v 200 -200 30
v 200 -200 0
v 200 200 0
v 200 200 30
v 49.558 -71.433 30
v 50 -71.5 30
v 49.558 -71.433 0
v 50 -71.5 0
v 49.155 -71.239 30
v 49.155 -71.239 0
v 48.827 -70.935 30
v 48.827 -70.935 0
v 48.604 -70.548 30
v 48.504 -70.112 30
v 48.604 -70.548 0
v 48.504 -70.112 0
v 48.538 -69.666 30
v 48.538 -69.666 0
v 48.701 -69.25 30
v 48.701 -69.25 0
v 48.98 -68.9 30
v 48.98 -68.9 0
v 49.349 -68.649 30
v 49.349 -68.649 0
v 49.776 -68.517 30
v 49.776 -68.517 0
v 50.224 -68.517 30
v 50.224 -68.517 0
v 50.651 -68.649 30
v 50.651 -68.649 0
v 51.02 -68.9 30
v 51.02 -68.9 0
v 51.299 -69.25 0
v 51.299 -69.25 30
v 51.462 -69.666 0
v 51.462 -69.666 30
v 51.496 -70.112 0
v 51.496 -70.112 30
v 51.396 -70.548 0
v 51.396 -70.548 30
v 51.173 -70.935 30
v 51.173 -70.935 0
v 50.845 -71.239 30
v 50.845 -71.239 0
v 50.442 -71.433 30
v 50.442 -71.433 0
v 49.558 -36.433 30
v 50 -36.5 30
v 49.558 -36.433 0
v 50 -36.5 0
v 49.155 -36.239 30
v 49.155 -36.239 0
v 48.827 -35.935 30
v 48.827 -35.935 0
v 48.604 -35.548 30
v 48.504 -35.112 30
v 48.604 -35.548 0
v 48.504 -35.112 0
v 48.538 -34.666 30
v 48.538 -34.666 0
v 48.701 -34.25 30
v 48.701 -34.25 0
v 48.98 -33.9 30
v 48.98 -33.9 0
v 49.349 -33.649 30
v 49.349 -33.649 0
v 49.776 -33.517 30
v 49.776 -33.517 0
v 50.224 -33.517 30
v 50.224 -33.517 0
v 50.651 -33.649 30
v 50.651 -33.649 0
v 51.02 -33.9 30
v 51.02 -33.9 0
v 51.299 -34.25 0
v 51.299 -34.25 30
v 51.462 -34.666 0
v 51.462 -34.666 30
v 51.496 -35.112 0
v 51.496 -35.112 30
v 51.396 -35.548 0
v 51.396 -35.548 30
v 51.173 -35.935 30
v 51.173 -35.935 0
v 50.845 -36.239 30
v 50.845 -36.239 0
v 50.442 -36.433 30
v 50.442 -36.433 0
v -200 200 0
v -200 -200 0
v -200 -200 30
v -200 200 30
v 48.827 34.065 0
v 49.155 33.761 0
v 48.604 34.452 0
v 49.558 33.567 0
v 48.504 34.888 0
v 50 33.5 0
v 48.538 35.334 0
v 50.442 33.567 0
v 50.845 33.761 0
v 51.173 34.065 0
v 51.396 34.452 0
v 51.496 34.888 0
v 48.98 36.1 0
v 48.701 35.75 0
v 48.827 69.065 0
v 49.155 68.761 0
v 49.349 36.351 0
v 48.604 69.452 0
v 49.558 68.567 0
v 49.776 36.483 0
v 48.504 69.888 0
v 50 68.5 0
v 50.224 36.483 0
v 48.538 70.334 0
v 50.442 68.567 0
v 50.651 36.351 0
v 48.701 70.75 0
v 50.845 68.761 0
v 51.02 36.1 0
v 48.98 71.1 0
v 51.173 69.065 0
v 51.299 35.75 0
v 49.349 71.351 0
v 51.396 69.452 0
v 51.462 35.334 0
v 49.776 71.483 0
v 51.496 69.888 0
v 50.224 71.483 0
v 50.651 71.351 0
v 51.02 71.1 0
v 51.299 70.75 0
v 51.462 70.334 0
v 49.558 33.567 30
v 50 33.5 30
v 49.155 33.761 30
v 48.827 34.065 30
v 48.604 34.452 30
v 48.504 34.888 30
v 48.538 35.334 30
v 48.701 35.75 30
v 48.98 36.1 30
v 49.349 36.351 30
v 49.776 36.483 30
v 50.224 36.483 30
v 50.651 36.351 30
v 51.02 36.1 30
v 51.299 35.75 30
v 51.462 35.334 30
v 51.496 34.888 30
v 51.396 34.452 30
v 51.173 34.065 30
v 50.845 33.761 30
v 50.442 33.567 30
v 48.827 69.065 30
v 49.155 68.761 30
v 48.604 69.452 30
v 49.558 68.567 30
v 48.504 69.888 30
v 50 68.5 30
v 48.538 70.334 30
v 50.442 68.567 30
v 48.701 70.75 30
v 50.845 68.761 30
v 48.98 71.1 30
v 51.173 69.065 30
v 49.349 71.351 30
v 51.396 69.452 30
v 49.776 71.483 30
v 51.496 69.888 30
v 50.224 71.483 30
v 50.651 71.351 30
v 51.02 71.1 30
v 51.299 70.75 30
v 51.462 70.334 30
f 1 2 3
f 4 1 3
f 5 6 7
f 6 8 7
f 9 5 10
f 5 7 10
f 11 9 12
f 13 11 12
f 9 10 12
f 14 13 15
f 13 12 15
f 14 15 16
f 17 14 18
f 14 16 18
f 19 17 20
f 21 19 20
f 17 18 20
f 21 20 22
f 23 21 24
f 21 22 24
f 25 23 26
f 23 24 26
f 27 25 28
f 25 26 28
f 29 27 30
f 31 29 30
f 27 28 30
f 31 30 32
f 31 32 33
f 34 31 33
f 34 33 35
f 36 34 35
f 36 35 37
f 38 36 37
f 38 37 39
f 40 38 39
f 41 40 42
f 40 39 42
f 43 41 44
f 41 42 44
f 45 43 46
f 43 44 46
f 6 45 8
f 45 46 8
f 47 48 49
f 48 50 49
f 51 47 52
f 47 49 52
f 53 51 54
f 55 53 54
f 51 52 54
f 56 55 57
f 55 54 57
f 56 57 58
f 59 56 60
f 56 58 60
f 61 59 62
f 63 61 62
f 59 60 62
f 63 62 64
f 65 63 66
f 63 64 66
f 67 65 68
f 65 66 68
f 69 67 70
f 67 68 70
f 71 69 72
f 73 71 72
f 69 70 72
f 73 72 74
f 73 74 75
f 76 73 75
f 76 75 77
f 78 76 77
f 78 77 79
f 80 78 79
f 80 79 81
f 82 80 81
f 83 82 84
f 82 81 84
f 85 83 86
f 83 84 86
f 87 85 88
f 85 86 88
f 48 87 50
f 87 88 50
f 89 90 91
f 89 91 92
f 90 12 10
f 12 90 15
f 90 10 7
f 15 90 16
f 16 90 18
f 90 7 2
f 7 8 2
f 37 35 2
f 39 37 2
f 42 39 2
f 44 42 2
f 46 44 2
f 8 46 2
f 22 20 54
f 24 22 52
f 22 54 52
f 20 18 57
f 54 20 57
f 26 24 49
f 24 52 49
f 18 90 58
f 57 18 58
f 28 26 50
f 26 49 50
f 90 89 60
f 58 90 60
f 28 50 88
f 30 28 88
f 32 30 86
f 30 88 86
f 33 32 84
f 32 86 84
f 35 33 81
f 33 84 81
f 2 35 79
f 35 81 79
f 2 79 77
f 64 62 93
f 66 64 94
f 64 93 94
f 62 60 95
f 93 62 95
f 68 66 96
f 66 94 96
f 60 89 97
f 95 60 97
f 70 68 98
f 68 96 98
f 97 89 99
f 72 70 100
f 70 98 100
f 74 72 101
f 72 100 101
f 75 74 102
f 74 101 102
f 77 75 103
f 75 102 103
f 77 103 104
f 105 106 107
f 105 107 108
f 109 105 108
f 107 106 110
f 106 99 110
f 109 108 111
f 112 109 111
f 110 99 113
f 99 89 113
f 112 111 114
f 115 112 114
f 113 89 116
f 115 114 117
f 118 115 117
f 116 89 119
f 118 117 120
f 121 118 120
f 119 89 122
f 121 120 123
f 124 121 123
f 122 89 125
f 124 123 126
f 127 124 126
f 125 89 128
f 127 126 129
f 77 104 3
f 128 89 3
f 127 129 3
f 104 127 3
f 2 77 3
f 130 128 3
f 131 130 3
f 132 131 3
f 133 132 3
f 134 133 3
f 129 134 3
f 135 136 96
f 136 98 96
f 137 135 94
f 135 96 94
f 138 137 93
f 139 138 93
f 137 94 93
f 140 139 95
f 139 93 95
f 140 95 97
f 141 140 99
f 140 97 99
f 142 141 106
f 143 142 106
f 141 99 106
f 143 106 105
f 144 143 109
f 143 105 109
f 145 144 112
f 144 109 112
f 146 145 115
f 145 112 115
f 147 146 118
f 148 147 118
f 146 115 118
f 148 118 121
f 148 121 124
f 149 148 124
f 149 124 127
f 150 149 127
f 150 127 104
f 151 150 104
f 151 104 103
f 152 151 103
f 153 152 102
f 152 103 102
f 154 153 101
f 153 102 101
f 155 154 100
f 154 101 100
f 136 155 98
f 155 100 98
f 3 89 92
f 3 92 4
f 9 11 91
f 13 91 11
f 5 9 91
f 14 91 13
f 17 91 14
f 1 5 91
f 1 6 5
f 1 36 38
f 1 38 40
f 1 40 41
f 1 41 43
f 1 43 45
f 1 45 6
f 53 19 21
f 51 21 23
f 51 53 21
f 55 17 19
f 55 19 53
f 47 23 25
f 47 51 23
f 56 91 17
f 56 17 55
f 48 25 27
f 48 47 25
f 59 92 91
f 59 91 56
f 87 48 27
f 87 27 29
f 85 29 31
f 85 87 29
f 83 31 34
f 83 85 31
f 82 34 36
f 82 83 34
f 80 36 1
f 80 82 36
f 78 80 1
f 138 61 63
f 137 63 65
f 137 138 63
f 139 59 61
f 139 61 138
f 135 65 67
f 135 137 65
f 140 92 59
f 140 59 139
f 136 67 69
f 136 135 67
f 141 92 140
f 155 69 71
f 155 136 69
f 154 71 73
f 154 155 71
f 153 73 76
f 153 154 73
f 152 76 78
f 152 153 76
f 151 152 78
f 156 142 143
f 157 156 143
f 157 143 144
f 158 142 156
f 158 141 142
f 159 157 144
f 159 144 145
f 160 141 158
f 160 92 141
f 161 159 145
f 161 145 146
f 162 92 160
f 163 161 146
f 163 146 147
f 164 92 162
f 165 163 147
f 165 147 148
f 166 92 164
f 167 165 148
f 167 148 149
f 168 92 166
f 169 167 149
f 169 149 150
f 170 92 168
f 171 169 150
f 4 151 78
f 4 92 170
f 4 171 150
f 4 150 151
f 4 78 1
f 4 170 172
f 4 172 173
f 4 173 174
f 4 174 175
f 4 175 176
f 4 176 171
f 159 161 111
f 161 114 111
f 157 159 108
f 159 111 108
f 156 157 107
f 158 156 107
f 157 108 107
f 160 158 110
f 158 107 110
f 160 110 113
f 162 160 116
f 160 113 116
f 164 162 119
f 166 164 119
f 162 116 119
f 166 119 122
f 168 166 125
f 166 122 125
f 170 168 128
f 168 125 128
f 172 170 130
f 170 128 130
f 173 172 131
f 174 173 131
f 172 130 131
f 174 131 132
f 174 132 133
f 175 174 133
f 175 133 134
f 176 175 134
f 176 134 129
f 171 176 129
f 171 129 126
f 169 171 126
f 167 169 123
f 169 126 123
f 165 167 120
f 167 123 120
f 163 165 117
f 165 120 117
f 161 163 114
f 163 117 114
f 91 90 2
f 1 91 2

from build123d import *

# Parameters (mm, degrees)
ESQUISSE1_W                          = 400
ESQUISSE1_H                          = 400
EXTRUSION1_DEPTH                     = 30
ESQUISSE4_W                          = 1.5
ESQUISSE4_H                          = 30
TROU_TARAUD_M32_AT_2_COUNT           = 2
TROU_TARAUD_M32_AT_2_PITCH           = 408.679576779
TROU_TARAUD_M32_AT_3_COUNT           = 2
TROU_TARAUD_M32_AT_3_PITCH           = 332.592834859
R_P_TITION_LIN_AIRE1_COUNT           = 5
R_P_TITION_LIN_AIRE1_PITCH           = 35
R_P_TITION_LIN_AIRE1_COPY_1_SKETCH_W = 1.5
R_P_TITION_LIN_AIRE1_COPY_1_SKETCH_H = 30
R_P_TITION_LIN_AIRE1_COPY_2_SKETCH_W = 1.5
R_P_TITION_LIN_AIRE1_COPY_2_SKETCH_H = 30
R_P_TITION_LIN_AIRE1_COPY_3_SKETCH_W = 1.5
R_P_TITION_LIN_AIRE1_COPY_3_SKETCH_H = 30
R_P_TITION_LIN_AIRE1_COPY_4_SKETCH_W = 1.5
R_P_TITION_LIN_AIRE1_COPY_4_SKETCH_H = 30
R_P_TITION_LIN_AIRE1_COPY_5_SKETCH_W = 1.5
R_P_TITION_LIN_AIRE1_COPY_5_SKETCH_H = 30
R_P_TITION_LIN_AIRE1_COPY_6_SKETCH_W = 1.5
R_P_TITION_LIN_AIRE1_COPY_6_SKETCH_H = 30


with BuildPart() as part:
    # Esquisse1 → Extrusion1 (new body)
    with BuildSketch(Plane.XY):
        Rectangle(ESQUISSE1_W, ESQUISSE1_H)
    extrude(amount=EXTRUSION1_DEPTH)

    # Esquisse4 → Trou taraudé M32 (revolve, cut)
    with BuildSketch(Plane(origin=(50, 70, 30), x_dir=(0, -1, 0), z_dir=(1, 0, 0))):
        with Locations((0.75, 15)):
            Rectangle(ESQUISSE4_W, ESQUISSE4_H)
    trou_taraud_m32 = revolve(axis=Axis((50, 70, 36.35), (0, 0, -1)), mode=Mode.SUBTRACT)

    # Trou taraudé M32 at 2: Trou taraudé M32 ×2
    with Locations(*[Vector(-0.8014096921823338, -0.5981157958758629, 0) * (i * TROU_TARAUD_M32_AT_2_PITCH) for i in range(1, TROU_TARAUD_M32_AT_2_COUNT)]):
        add(trou_taraud_m32, mode=Mode.SUBTRACT)

    # Trou taraudé M32 at 3: Trou taraudé M32 ×2
    with Locations(*[Vector(-0.8119019030947789, -0.5837938846468643, 0) * (i * TROU_TARAUD_M32_AT_3_PITCH) for i in range(1, TROU_TARAUD_M32_AT_3_COUNT)]):
        add(trou_taraud_m32, mode=Mode.SUBTRACT)

    # Répétition linéaire1: Trou taraudé M32 ×5, 1 skipped
    with Locations(*[(0, -i * R_P_TITION_LIN_AIRE1_PITCH, 0) for i in range(1, R_P_TITION_LIN_AIRE1_COUNT) if i not in (2,)]):
        add(trou_taraud_m32, mode=Mode.SUBTRACT)

    # Répétition linéaire1 copy 1 sketch → Répétition linéaire1 copy 1 (revolve, cut)
    with BuildSketch(Plane(origin=(-277.519773828, -209.437710323, 30), x_dir=(0, -1, 0), z_dir=(1, 0, 0))):
        with Locations((0.75, 15)):
            Rectangle(R_P_TITION_LIN_AIRE1_COPY_1_SKETCH_W, R_P_TITION_LIN_AIRE1_COPY_1_SKETCH_H)
    revolve(axis=Axis((-277.519773828, -209.437710323, 36.35), (0, 0, -1)), mode=Mode.SUBTRACT)

    # Répétition linéaire1 copy 2 sketch → Répétition linéaire1 copy 2 (revolve, cut)
    with BuildSketch(Plane(origin=(-277.519773828, -279.437710323, 30), x_dir=(0, -1, 0), z_dir=(1, 0, 0))):
        with Locations((0.75, 15)):
            Rectangle(R_P_TITION_LIN_AIRE1_COPY_2_SKETCH_W, R_P_TITION_LIN_AIRE1_COPY_2_SKETCH_H)
    revolve(axis=Axis((-277.519773828, -279.437710323, 36.35), (0, 0, -1)), mode=Mode.SUBTRACT)

    # Répétition linéaire1 copy 3 sketch → Répétition linéaire1 copy 3 (revolve, cut)
    with BuildSketch(Plane(origin=(-277.519773828, -314.437710323, 30), x_dir=(0, -1, 0), z_dir=(1, 0, 0))):
        with Locations((0.75, 15)):
            Rectangle(R_P_TITION_LIN_AIRE1_COPY_3_SKETCH_W, R_P_TITION_LIN_AIRE1_COPY_3_SKETCH_H)
    revolve(axis=Axis((-277.519773828, -314.437710323, 36.35), (0, 0, -1)), mode=Mode.SUBTRACT)

    # Répétition linéaire1 copy 4 sketch → Répétition linéaire1 copy 4 (revolve, cut)
    with BuildSketch(Plane(origin=(-220.032755578, -159.165663068, 30), x_dir=(0, -1, 0), z_dir=(1, 0, 0))):
        with Locations((0.75, 15)):
            Rectangle(R_P_TITION_LIN_AIRE1_COPY_4_SKETCH_W, R_P_TITION_LIN_AIRE1_COPY_4_SKETCH_H)
    revolve(axis=Axis((-220.032755578, -159.165663068, 36.35), (0, 0, -1)), mode=Mode.SUBTRACT)

    # Répétition linéaire1 copy 5 sketch → Répétition linéaire1 copy 5 (revolve, cut)
    with BuildSketch(Plane(origin=(-220.032755578, -229.165663068, 30), x_dir=(0, -1, 0), z_dir=(1, 0, 0))):
        with Locations((0.75, 15)):
            Rectangle(R_P_TITION_LIN_AIRE1_COPY_5_SKETCH_W, R_P_TITION_LIN_AIRE1_COPY_5_SKETCH_H)
    revolve(axis=Axis((-220.032755578, -229.165663068, 36.35), (0, 0, -1)), mode=Mode.SUBTRACT)

    # Répétition linéaire1 copy 6 sketch → Répétition linéaire1 copy 6 (revolve, cut)
    with BuildSketch(Plane(origin=(-220.032755578, -264.165663068, 30), x_dir=(0, -1, 0), z_dir=(1, 0, 0))):
        with Locations((0.75, 15)):
            Rectangle(R_P_TITION_LIN_AIRE1_COPY_6_SKETCH_W, R_P_TITION_LIN_AIRE1_COPY_6_SKETCH_H)
    revolve(axis=Axis((-220.032755578, -264.165663068, 36.35), (0, 0, -1)), mode=Mode.SUBTRACT)


solid = part.part
